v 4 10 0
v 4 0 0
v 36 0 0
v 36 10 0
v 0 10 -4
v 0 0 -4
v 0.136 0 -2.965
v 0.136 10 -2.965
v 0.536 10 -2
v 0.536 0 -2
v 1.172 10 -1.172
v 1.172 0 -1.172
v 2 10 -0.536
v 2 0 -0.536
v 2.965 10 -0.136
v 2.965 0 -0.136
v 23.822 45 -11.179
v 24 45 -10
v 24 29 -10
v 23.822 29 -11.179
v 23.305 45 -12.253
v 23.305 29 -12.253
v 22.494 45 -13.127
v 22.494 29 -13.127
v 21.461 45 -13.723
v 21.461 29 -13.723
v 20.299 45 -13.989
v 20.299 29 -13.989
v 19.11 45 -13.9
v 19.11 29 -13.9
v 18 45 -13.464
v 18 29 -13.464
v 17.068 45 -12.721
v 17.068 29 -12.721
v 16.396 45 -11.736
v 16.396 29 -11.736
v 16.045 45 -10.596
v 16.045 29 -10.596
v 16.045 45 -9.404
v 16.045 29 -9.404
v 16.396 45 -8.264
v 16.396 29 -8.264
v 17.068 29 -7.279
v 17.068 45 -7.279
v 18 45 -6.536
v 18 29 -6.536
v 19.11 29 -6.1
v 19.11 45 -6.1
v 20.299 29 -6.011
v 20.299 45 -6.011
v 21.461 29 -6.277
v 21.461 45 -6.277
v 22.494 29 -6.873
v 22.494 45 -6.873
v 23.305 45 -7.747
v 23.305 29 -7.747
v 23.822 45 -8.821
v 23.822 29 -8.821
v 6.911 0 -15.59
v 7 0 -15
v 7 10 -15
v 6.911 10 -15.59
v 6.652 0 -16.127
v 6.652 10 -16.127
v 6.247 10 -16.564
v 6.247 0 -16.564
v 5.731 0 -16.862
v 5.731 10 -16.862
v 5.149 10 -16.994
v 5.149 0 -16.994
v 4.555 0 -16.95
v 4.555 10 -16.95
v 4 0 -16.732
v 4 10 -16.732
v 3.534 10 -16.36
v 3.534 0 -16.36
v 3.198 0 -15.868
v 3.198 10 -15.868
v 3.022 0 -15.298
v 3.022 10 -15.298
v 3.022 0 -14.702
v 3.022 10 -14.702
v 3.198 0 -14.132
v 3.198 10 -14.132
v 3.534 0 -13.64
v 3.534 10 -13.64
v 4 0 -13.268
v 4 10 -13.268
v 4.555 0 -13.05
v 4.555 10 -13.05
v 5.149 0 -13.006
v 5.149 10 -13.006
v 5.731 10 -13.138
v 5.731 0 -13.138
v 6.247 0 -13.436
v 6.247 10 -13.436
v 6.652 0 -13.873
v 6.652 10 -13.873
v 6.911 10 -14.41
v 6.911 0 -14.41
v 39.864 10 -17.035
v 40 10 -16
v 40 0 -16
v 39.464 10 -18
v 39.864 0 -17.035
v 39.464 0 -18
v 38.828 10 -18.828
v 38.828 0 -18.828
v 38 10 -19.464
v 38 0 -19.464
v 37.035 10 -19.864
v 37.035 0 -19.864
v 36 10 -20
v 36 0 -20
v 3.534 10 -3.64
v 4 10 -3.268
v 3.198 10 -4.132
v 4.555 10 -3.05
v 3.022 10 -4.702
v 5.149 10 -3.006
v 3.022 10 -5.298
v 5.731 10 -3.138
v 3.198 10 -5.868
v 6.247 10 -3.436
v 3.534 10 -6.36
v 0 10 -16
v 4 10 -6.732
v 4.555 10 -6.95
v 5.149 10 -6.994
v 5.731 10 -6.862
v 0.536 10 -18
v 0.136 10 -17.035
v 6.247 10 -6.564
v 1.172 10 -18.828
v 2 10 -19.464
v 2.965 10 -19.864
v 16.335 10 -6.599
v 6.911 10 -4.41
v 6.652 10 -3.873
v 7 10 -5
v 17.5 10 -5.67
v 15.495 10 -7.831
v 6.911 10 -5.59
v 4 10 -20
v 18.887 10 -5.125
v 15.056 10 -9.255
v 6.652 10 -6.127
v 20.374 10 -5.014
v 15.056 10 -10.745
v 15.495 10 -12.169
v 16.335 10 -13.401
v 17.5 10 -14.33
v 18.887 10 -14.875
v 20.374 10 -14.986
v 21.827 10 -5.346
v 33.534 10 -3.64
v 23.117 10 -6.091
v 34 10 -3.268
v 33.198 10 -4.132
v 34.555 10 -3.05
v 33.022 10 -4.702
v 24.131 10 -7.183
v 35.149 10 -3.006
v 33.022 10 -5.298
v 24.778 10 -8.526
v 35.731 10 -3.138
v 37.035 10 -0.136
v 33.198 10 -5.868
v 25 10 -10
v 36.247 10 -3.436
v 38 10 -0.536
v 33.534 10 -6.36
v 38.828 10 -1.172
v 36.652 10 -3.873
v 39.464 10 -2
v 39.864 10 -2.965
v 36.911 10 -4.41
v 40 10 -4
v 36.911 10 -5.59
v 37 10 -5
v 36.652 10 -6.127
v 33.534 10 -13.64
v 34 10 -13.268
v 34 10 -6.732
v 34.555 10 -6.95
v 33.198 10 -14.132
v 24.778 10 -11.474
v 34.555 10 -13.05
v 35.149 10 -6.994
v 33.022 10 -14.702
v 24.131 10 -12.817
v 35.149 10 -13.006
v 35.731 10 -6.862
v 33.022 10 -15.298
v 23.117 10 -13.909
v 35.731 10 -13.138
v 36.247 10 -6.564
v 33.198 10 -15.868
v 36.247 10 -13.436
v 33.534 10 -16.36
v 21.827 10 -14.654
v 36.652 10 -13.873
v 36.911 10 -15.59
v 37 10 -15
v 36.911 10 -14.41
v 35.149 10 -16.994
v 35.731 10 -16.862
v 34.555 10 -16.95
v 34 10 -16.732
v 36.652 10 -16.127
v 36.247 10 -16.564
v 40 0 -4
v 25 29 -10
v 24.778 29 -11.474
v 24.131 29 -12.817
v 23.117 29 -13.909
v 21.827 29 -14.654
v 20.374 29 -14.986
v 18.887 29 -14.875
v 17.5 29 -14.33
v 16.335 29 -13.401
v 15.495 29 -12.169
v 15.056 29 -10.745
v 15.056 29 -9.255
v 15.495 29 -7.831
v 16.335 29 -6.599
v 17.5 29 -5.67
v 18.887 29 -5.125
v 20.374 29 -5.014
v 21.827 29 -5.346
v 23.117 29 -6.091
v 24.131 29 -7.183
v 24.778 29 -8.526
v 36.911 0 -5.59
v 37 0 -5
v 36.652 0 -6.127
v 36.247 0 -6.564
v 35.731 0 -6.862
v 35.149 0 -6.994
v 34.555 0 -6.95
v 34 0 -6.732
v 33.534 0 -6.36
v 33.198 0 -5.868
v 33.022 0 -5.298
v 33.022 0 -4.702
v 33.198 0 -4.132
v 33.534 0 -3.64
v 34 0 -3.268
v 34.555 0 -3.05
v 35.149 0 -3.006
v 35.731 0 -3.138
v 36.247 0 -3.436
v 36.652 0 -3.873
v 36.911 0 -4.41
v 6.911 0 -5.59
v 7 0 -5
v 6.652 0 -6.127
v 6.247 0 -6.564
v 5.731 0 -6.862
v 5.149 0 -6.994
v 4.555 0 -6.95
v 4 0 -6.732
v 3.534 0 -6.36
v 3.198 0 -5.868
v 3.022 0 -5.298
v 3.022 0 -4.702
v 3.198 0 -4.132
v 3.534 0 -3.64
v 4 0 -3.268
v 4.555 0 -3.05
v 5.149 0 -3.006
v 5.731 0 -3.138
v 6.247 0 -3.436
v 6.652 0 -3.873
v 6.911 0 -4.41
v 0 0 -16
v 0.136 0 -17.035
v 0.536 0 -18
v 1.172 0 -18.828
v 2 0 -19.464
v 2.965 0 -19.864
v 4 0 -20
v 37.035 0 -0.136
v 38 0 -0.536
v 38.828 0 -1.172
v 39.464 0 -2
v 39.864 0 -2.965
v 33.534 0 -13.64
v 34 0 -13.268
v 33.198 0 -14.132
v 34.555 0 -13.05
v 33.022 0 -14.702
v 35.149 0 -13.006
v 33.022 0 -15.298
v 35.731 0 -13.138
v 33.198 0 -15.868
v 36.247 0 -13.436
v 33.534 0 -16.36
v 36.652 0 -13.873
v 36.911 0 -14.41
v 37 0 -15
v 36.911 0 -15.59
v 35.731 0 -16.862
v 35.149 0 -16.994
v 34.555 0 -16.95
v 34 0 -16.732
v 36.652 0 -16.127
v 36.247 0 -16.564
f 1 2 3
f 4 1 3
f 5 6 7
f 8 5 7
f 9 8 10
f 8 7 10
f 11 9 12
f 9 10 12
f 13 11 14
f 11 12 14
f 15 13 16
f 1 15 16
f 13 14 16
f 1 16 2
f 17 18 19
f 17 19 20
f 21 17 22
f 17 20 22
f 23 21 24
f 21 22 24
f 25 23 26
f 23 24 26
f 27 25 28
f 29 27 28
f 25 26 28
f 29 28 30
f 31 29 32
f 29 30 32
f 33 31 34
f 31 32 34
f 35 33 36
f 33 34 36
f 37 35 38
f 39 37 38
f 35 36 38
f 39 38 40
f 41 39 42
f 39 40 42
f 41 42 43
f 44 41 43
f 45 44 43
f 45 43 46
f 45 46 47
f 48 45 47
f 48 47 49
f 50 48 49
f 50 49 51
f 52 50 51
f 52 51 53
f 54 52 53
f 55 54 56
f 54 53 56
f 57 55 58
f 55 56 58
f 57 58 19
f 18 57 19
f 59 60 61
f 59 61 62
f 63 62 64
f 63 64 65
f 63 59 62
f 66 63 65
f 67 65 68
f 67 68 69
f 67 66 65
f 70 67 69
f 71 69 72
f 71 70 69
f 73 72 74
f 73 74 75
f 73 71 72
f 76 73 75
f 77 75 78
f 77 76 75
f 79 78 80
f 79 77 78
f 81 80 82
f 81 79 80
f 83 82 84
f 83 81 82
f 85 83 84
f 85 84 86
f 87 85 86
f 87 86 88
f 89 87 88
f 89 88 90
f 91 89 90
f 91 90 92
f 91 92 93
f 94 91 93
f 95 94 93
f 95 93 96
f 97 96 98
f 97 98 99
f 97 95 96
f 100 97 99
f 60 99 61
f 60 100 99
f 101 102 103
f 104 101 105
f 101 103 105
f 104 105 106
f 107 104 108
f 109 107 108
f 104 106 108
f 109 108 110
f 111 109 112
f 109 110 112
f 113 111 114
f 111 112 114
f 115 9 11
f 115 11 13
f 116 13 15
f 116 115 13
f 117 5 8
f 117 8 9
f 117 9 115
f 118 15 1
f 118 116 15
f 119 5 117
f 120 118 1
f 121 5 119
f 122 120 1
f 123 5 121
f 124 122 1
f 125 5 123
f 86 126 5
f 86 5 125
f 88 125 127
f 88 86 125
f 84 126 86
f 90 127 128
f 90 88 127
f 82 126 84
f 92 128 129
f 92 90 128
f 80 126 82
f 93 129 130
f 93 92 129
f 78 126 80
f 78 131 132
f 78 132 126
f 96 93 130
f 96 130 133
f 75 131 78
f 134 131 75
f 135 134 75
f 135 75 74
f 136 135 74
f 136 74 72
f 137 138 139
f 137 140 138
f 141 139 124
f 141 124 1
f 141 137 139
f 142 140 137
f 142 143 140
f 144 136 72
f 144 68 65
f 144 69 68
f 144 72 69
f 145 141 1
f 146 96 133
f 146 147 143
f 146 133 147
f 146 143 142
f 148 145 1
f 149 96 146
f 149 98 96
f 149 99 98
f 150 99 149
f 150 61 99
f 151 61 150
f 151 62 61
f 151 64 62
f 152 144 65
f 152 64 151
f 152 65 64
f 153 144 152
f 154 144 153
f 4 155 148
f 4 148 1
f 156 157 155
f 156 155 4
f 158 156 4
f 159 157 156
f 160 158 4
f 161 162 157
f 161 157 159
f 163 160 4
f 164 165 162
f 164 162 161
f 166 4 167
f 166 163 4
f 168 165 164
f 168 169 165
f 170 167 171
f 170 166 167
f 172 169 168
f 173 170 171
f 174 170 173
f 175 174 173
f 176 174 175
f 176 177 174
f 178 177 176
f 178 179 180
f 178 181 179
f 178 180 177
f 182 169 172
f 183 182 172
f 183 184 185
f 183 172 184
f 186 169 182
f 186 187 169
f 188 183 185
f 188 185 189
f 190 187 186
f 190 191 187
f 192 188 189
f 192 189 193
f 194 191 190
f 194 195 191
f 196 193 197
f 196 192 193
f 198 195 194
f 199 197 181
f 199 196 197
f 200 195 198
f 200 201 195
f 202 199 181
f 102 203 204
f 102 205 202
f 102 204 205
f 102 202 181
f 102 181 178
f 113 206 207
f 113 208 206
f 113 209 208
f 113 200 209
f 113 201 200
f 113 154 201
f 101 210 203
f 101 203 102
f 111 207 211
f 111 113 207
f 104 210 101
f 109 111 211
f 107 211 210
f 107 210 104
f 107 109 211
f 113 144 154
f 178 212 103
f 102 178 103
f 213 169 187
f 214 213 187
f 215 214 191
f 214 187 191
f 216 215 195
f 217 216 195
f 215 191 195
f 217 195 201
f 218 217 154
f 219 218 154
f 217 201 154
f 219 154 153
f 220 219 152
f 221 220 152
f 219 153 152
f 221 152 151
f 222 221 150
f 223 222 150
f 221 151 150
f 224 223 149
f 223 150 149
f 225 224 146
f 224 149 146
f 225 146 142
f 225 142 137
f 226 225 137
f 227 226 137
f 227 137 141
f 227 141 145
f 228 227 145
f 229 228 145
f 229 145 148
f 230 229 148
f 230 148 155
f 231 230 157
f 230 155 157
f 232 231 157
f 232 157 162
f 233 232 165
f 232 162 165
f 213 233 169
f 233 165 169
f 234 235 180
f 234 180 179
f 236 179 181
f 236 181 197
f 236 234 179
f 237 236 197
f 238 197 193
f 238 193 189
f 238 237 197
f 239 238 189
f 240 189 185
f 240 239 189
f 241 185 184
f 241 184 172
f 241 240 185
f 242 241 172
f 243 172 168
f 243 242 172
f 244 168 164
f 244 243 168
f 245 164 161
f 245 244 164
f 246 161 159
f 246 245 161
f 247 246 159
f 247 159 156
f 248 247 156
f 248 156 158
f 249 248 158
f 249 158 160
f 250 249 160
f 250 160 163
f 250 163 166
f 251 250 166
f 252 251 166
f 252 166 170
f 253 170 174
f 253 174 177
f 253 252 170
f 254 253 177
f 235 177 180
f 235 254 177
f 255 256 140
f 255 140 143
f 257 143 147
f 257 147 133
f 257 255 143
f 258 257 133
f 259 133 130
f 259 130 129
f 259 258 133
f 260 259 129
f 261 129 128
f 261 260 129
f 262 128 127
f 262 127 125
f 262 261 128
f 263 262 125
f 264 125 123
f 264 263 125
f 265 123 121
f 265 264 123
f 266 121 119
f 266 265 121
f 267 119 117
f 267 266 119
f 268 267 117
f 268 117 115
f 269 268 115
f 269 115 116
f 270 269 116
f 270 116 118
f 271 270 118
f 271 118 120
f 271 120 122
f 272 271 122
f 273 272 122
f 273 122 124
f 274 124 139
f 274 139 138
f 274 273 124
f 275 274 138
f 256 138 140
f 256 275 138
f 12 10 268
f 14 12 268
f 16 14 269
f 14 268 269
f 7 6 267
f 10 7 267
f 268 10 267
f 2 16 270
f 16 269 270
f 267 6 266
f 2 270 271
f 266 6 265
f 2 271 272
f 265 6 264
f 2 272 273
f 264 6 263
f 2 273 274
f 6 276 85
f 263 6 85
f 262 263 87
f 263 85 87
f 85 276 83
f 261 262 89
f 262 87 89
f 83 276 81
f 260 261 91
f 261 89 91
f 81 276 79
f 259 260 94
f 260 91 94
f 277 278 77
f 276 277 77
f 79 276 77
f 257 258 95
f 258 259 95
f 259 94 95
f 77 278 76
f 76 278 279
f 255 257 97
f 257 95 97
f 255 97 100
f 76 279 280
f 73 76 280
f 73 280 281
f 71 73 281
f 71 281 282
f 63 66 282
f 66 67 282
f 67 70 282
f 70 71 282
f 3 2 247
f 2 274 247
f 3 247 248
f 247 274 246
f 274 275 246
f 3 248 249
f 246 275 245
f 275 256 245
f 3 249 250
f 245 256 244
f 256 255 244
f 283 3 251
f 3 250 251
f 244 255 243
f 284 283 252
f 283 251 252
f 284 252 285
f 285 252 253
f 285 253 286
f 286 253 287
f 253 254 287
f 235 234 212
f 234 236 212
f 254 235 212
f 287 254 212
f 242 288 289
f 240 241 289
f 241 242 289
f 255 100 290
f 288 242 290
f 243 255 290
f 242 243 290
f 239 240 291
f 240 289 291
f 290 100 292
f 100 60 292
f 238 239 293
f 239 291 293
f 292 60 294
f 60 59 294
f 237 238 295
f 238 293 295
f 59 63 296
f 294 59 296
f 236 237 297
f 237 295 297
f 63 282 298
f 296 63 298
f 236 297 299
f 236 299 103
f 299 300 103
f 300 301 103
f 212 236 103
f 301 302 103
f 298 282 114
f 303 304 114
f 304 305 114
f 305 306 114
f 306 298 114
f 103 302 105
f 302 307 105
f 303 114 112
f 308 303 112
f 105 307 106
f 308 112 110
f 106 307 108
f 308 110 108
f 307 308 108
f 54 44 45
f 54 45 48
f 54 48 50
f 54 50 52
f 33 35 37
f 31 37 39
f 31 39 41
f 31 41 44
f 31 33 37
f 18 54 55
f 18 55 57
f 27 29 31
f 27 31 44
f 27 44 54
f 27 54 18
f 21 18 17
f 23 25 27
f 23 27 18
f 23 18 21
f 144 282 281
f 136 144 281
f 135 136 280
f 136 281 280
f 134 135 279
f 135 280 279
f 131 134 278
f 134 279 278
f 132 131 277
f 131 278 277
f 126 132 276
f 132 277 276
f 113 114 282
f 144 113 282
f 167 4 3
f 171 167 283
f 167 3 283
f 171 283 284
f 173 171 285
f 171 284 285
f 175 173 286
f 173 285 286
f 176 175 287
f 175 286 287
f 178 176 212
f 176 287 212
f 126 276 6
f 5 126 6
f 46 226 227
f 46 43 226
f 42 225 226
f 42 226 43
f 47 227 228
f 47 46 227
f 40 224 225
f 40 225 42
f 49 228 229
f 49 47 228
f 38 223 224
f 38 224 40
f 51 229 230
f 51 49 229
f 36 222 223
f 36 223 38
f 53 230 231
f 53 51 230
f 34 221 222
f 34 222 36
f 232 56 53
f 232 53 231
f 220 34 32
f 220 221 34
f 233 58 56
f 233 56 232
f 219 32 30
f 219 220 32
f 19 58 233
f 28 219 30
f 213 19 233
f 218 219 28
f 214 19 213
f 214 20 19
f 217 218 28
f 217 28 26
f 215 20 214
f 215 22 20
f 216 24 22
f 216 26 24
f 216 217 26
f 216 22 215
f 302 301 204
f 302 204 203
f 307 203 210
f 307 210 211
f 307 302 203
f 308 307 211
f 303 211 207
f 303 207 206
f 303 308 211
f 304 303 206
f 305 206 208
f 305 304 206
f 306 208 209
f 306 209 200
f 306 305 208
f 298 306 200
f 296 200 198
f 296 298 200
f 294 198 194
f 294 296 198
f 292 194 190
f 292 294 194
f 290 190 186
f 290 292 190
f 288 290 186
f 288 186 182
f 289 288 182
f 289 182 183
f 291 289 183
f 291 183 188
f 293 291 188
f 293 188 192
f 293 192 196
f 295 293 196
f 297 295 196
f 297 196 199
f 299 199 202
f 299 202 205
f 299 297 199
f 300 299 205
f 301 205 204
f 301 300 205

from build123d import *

# Parameters (mm, degrees)
SKETCH1_R           = 2
BOSS_EXTRUDE1_DEPTH = 10
SKETCH2_R           = 5
BOSS_EXTRUDE2_DEPTH = 19
SKETCH3_R           = 4
BOSS_EXTRUDE3_DEPTH = 16


with BuildPart() as part:
    # Sketch1 → Boss-Extrude1 (new body)
    with BuildSketch(Plane(origin=(0, 0, 0), x_dir=(1, 0, 0), z_dir=(0, 1, 0))):
        with BuildLine():
            Line((4, 0), (36, 0))
            ThreePointArc((36, 0), (38.828427125, 1.171572875), (40, 4))
            Line((40, 4), (40, 16))
            ThreePointArc((40, 16), (38.828427125, 18.828427125), (36, 20))
            Line((36, 20), (4, 20))
            ThreePointArc((4, 20), (1.171572875, 18.828427125), (0, 16))
            Line((0, 16), (0, 4))
            ThreePointArc((0, 4), (1.171572875, 1.171572875), (4, 0))
        make_face()
        with Locations((5, 15)):
            Circle(SKETCH1_R, mode=Mode.SUBTRACT)
        with Locations((5, 5)):
            Circle(SKETCH1_R, mode=Mode.SUBTRACT)
        with Locations((35, 5)):
            Circle(SKETCH1_R, mode=Mode.SUBTRACT)
        with Locations((35, 15)):
            Circle(SKETCH1_R, mode=Mode.SUBTRACT)
    extrude(amount=BOSS_EXTRUDE1_DEPTH)

    # Sketch2 → Boss-Extrude2 (add)
    with BuildSketch(Plane(origin=(0, 10, 0), x_dir=(1, 0, 0), z_dir=(0, 1, 0))):
        with Locations((20, 10)):
            Circle(SKETCH2_R)
    extrude(amount=BOSS_EXTRUDE2_DEPTH)

    # Sketch3 → Boss-Extrude3 (add)
    with BuildSketch(Plane(origin=(0, 29, 0), x_dir=(1, 0, 0), z_dir=(0, 1, 0))):
        with Locations((20, 10)):
            Circle(SKETCH3_R)
    extrude(amount=BOSS_EXTRUDE3_DEPTH)


solid = part.part
